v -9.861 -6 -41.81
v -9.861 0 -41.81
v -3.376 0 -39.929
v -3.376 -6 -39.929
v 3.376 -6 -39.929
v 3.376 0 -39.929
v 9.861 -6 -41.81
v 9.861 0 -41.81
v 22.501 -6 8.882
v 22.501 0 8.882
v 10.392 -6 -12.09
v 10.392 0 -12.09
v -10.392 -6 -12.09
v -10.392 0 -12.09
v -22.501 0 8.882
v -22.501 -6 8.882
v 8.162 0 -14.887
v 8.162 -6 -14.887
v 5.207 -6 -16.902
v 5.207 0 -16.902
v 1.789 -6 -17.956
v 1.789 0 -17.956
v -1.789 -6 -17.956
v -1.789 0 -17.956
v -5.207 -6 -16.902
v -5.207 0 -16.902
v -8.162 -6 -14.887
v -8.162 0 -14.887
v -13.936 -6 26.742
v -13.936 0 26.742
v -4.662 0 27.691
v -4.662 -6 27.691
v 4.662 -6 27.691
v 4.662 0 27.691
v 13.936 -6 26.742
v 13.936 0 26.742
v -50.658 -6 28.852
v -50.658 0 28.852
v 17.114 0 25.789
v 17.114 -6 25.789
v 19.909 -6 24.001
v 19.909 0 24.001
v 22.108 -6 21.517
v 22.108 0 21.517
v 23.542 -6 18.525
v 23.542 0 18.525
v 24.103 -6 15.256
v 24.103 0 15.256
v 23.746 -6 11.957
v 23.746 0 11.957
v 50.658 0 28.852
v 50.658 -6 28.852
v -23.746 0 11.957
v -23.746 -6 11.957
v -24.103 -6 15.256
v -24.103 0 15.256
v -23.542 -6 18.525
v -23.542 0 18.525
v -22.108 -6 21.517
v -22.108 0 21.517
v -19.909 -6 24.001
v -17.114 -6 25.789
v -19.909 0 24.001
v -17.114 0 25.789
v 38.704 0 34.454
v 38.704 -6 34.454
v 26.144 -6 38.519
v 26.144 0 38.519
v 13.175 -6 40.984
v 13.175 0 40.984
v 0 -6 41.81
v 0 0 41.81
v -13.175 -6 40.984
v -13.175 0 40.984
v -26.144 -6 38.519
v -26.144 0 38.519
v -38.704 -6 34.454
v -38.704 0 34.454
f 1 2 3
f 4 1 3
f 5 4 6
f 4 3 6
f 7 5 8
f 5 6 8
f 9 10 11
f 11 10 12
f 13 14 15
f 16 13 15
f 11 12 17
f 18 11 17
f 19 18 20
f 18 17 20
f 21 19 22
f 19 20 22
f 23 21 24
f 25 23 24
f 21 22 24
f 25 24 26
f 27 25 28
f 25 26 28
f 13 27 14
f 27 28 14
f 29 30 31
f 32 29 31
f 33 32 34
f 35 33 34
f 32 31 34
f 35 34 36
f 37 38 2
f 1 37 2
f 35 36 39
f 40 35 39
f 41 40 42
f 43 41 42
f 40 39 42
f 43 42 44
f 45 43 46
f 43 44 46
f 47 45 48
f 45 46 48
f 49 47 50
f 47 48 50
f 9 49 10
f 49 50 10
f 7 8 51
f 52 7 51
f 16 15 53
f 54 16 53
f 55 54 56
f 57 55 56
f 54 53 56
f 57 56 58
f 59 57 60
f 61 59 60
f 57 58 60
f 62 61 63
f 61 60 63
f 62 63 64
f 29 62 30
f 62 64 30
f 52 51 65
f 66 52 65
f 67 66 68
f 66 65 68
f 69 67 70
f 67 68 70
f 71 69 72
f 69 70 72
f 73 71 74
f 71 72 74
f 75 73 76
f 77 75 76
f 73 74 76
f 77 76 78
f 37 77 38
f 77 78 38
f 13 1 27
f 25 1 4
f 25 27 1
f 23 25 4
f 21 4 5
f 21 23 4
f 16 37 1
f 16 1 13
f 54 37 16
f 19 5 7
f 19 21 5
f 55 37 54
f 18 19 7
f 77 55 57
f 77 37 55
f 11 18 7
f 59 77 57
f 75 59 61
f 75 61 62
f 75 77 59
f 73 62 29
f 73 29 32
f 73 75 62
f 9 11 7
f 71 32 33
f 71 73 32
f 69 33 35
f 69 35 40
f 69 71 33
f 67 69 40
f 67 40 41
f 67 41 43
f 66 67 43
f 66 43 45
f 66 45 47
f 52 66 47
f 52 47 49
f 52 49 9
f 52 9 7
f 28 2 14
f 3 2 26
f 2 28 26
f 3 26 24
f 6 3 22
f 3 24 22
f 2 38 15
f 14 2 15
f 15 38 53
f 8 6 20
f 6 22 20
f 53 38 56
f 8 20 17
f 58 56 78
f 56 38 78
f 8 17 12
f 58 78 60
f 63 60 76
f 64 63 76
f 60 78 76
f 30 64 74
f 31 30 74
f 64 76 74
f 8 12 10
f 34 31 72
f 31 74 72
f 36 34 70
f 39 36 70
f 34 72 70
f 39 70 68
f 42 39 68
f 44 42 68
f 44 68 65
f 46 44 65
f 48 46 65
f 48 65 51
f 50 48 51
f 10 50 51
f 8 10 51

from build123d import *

# Parameters (mm, degrees)
F1_DEPTH = 6


# Not quite as in the source:
# - ends of sketch curves that miss each other by under 0.0002 mm in the source are joined


with BuildPart() as f1:
    # F0 (on Front) → F1 (new body)
    with BuildSketch(Plane.XZ):
        with BuildLine():
            ThreePointArc((50.6578879007, 28.8518228186), (0, 41.809787), (-50.6578879007, 28.8518228186))
            Line((-50.6578879007, 28.8518228186), (-9.861388, -41.809787))
            ThreePointArc((-9.861388, -41.809787), (4.558e-07, -39.690213), (9.8613887008, -41.8097876638))
            Line((9.8613887008, -41.8097876638), (50.6578879007, 28.8518228186))
        make_face()
        with BuildLine():
            ThreePointArc((10.3923048841, -12.0902129331), (0, -18.090213), (-10.3923048841, -12.0902129331))
            Line((-10.3923048841, -12.0902129331), (-22.500773, 8.88227))
            ThreePointArc((-22.500773, 8.88227), (-22.9286788819, 20.0710113186), (-13.93616106, 26.7422673895))
            ThreePointArc((-13.93616106, 26.7422673895), (4.942e-07, 27.809787), (13.9361619582, 26.7422667287))
            ThreePointArc((13.9361619582, 26.7422667287), (22.92867999, 20.0710110932), (22.5007736341, 8.8822696339))
            Line((22.5007736341, 8.8822696339), (10.3923048841, -12.0902129331))
        make_face(mode=Mode.SUBTRACT)
    extrude(amount=F1_DEPTH)


solid = f1.part
